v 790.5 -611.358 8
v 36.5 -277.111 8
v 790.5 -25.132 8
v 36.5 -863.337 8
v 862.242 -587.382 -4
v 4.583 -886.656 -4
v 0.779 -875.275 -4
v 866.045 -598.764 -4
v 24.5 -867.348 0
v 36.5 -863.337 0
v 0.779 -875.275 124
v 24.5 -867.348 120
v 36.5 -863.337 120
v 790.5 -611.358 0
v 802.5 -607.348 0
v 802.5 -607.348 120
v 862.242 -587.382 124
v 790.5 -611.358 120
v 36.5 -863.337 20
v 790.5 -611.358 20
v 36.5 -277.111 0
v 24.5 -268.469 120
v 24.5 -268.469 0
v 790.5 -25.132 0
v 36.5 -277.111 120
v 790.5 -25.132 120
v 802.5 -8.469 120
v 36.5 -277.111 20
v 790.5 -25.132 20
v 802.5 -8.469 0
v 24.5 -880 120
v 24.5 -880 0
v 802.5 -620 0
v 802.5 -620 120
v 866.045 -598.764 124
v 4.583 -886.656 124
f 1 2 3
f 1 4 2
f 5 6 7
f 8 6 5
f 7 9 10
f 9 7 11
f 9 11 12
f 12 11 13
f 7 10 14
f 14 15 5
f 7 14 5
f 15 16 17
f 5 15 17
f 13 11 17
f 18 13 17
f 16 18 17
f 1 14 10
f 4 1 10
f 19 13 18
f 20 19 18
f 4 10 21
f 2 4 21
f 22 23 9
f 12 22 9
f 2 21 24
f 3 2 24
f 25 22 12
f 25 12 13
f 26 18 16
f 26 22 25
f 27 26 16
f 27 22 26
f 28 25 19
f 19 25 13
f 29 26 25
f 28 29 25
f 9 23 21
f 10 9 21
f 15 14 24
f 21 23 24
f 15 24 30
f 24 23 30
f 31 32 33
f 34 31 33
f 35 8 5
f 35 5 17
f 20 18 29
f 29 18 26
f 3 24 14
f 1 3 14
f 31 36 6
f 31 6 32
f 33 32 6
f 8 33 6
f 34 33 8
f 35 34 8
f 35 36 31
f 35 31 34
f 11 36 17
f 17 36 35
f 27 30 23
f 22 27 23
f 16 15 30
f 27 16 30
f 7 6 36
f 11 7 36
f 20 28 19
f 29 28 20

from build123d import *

# Parameters (mm, degrees)
F1_DEPTH = 120
F3_DEPTH = 8
F5_DEPTH = 100
F6_W     = 908.2950688624
F6_H     = 128
F7_DEPTH = 12


with BuildPart() as f1:
    # F0 (on Top) → F1 (new body)
    with BuildSketch(Plane.XY):
        Polygon((802.5, -8.4689717992), (24.5, -268.4689717992), (24.5, -880), (802.5, -620), align=None)
    extrude(amount=F1_DEPTH)

    # F2 (on face) → F3 (cut)
    with BuildSketch(Plane(origin=(0, 0, 0), x_dir=(1, 0, 0), z_dir=(0, 0, -1))):
        Polygon((36.5, 277.1110551236), (790.5, 25.1316206763), (790.5, 611.3579166756), (36.5, 863.3373511229), align=None)
    extrude(amount=-F3_DEPTH, mode=Mode.SUBTRACT)

    # F4 (on face) → F5 (cut, through all)
    with BuildSketch(Plane.XY.offset(120)):
        Polygon((790.5, -611.3579166756), (790.5, -25.1316206763), (36.5, -277.1110551236), (36.5, -863.3373511229), align=None)
    extrude(amount=-F5_DEPTH, mode=Mode.SUBTRACT)

    # F6 (on face) → F7 (join, through all)
    with BuildSketch(Plane(origin=(267.0038223527, -798.9575915017, 0), x_dir=(0.9484392014, 0.3169591161, 0), z_dir=(0.3169591161, -0.9484392014, 0))):
        with Locations((177.4602726623, 60)):
            Rectangle(F6_W, F6_H)
    extrude(amount=-F7_DEPTH)


solid = f1.part
